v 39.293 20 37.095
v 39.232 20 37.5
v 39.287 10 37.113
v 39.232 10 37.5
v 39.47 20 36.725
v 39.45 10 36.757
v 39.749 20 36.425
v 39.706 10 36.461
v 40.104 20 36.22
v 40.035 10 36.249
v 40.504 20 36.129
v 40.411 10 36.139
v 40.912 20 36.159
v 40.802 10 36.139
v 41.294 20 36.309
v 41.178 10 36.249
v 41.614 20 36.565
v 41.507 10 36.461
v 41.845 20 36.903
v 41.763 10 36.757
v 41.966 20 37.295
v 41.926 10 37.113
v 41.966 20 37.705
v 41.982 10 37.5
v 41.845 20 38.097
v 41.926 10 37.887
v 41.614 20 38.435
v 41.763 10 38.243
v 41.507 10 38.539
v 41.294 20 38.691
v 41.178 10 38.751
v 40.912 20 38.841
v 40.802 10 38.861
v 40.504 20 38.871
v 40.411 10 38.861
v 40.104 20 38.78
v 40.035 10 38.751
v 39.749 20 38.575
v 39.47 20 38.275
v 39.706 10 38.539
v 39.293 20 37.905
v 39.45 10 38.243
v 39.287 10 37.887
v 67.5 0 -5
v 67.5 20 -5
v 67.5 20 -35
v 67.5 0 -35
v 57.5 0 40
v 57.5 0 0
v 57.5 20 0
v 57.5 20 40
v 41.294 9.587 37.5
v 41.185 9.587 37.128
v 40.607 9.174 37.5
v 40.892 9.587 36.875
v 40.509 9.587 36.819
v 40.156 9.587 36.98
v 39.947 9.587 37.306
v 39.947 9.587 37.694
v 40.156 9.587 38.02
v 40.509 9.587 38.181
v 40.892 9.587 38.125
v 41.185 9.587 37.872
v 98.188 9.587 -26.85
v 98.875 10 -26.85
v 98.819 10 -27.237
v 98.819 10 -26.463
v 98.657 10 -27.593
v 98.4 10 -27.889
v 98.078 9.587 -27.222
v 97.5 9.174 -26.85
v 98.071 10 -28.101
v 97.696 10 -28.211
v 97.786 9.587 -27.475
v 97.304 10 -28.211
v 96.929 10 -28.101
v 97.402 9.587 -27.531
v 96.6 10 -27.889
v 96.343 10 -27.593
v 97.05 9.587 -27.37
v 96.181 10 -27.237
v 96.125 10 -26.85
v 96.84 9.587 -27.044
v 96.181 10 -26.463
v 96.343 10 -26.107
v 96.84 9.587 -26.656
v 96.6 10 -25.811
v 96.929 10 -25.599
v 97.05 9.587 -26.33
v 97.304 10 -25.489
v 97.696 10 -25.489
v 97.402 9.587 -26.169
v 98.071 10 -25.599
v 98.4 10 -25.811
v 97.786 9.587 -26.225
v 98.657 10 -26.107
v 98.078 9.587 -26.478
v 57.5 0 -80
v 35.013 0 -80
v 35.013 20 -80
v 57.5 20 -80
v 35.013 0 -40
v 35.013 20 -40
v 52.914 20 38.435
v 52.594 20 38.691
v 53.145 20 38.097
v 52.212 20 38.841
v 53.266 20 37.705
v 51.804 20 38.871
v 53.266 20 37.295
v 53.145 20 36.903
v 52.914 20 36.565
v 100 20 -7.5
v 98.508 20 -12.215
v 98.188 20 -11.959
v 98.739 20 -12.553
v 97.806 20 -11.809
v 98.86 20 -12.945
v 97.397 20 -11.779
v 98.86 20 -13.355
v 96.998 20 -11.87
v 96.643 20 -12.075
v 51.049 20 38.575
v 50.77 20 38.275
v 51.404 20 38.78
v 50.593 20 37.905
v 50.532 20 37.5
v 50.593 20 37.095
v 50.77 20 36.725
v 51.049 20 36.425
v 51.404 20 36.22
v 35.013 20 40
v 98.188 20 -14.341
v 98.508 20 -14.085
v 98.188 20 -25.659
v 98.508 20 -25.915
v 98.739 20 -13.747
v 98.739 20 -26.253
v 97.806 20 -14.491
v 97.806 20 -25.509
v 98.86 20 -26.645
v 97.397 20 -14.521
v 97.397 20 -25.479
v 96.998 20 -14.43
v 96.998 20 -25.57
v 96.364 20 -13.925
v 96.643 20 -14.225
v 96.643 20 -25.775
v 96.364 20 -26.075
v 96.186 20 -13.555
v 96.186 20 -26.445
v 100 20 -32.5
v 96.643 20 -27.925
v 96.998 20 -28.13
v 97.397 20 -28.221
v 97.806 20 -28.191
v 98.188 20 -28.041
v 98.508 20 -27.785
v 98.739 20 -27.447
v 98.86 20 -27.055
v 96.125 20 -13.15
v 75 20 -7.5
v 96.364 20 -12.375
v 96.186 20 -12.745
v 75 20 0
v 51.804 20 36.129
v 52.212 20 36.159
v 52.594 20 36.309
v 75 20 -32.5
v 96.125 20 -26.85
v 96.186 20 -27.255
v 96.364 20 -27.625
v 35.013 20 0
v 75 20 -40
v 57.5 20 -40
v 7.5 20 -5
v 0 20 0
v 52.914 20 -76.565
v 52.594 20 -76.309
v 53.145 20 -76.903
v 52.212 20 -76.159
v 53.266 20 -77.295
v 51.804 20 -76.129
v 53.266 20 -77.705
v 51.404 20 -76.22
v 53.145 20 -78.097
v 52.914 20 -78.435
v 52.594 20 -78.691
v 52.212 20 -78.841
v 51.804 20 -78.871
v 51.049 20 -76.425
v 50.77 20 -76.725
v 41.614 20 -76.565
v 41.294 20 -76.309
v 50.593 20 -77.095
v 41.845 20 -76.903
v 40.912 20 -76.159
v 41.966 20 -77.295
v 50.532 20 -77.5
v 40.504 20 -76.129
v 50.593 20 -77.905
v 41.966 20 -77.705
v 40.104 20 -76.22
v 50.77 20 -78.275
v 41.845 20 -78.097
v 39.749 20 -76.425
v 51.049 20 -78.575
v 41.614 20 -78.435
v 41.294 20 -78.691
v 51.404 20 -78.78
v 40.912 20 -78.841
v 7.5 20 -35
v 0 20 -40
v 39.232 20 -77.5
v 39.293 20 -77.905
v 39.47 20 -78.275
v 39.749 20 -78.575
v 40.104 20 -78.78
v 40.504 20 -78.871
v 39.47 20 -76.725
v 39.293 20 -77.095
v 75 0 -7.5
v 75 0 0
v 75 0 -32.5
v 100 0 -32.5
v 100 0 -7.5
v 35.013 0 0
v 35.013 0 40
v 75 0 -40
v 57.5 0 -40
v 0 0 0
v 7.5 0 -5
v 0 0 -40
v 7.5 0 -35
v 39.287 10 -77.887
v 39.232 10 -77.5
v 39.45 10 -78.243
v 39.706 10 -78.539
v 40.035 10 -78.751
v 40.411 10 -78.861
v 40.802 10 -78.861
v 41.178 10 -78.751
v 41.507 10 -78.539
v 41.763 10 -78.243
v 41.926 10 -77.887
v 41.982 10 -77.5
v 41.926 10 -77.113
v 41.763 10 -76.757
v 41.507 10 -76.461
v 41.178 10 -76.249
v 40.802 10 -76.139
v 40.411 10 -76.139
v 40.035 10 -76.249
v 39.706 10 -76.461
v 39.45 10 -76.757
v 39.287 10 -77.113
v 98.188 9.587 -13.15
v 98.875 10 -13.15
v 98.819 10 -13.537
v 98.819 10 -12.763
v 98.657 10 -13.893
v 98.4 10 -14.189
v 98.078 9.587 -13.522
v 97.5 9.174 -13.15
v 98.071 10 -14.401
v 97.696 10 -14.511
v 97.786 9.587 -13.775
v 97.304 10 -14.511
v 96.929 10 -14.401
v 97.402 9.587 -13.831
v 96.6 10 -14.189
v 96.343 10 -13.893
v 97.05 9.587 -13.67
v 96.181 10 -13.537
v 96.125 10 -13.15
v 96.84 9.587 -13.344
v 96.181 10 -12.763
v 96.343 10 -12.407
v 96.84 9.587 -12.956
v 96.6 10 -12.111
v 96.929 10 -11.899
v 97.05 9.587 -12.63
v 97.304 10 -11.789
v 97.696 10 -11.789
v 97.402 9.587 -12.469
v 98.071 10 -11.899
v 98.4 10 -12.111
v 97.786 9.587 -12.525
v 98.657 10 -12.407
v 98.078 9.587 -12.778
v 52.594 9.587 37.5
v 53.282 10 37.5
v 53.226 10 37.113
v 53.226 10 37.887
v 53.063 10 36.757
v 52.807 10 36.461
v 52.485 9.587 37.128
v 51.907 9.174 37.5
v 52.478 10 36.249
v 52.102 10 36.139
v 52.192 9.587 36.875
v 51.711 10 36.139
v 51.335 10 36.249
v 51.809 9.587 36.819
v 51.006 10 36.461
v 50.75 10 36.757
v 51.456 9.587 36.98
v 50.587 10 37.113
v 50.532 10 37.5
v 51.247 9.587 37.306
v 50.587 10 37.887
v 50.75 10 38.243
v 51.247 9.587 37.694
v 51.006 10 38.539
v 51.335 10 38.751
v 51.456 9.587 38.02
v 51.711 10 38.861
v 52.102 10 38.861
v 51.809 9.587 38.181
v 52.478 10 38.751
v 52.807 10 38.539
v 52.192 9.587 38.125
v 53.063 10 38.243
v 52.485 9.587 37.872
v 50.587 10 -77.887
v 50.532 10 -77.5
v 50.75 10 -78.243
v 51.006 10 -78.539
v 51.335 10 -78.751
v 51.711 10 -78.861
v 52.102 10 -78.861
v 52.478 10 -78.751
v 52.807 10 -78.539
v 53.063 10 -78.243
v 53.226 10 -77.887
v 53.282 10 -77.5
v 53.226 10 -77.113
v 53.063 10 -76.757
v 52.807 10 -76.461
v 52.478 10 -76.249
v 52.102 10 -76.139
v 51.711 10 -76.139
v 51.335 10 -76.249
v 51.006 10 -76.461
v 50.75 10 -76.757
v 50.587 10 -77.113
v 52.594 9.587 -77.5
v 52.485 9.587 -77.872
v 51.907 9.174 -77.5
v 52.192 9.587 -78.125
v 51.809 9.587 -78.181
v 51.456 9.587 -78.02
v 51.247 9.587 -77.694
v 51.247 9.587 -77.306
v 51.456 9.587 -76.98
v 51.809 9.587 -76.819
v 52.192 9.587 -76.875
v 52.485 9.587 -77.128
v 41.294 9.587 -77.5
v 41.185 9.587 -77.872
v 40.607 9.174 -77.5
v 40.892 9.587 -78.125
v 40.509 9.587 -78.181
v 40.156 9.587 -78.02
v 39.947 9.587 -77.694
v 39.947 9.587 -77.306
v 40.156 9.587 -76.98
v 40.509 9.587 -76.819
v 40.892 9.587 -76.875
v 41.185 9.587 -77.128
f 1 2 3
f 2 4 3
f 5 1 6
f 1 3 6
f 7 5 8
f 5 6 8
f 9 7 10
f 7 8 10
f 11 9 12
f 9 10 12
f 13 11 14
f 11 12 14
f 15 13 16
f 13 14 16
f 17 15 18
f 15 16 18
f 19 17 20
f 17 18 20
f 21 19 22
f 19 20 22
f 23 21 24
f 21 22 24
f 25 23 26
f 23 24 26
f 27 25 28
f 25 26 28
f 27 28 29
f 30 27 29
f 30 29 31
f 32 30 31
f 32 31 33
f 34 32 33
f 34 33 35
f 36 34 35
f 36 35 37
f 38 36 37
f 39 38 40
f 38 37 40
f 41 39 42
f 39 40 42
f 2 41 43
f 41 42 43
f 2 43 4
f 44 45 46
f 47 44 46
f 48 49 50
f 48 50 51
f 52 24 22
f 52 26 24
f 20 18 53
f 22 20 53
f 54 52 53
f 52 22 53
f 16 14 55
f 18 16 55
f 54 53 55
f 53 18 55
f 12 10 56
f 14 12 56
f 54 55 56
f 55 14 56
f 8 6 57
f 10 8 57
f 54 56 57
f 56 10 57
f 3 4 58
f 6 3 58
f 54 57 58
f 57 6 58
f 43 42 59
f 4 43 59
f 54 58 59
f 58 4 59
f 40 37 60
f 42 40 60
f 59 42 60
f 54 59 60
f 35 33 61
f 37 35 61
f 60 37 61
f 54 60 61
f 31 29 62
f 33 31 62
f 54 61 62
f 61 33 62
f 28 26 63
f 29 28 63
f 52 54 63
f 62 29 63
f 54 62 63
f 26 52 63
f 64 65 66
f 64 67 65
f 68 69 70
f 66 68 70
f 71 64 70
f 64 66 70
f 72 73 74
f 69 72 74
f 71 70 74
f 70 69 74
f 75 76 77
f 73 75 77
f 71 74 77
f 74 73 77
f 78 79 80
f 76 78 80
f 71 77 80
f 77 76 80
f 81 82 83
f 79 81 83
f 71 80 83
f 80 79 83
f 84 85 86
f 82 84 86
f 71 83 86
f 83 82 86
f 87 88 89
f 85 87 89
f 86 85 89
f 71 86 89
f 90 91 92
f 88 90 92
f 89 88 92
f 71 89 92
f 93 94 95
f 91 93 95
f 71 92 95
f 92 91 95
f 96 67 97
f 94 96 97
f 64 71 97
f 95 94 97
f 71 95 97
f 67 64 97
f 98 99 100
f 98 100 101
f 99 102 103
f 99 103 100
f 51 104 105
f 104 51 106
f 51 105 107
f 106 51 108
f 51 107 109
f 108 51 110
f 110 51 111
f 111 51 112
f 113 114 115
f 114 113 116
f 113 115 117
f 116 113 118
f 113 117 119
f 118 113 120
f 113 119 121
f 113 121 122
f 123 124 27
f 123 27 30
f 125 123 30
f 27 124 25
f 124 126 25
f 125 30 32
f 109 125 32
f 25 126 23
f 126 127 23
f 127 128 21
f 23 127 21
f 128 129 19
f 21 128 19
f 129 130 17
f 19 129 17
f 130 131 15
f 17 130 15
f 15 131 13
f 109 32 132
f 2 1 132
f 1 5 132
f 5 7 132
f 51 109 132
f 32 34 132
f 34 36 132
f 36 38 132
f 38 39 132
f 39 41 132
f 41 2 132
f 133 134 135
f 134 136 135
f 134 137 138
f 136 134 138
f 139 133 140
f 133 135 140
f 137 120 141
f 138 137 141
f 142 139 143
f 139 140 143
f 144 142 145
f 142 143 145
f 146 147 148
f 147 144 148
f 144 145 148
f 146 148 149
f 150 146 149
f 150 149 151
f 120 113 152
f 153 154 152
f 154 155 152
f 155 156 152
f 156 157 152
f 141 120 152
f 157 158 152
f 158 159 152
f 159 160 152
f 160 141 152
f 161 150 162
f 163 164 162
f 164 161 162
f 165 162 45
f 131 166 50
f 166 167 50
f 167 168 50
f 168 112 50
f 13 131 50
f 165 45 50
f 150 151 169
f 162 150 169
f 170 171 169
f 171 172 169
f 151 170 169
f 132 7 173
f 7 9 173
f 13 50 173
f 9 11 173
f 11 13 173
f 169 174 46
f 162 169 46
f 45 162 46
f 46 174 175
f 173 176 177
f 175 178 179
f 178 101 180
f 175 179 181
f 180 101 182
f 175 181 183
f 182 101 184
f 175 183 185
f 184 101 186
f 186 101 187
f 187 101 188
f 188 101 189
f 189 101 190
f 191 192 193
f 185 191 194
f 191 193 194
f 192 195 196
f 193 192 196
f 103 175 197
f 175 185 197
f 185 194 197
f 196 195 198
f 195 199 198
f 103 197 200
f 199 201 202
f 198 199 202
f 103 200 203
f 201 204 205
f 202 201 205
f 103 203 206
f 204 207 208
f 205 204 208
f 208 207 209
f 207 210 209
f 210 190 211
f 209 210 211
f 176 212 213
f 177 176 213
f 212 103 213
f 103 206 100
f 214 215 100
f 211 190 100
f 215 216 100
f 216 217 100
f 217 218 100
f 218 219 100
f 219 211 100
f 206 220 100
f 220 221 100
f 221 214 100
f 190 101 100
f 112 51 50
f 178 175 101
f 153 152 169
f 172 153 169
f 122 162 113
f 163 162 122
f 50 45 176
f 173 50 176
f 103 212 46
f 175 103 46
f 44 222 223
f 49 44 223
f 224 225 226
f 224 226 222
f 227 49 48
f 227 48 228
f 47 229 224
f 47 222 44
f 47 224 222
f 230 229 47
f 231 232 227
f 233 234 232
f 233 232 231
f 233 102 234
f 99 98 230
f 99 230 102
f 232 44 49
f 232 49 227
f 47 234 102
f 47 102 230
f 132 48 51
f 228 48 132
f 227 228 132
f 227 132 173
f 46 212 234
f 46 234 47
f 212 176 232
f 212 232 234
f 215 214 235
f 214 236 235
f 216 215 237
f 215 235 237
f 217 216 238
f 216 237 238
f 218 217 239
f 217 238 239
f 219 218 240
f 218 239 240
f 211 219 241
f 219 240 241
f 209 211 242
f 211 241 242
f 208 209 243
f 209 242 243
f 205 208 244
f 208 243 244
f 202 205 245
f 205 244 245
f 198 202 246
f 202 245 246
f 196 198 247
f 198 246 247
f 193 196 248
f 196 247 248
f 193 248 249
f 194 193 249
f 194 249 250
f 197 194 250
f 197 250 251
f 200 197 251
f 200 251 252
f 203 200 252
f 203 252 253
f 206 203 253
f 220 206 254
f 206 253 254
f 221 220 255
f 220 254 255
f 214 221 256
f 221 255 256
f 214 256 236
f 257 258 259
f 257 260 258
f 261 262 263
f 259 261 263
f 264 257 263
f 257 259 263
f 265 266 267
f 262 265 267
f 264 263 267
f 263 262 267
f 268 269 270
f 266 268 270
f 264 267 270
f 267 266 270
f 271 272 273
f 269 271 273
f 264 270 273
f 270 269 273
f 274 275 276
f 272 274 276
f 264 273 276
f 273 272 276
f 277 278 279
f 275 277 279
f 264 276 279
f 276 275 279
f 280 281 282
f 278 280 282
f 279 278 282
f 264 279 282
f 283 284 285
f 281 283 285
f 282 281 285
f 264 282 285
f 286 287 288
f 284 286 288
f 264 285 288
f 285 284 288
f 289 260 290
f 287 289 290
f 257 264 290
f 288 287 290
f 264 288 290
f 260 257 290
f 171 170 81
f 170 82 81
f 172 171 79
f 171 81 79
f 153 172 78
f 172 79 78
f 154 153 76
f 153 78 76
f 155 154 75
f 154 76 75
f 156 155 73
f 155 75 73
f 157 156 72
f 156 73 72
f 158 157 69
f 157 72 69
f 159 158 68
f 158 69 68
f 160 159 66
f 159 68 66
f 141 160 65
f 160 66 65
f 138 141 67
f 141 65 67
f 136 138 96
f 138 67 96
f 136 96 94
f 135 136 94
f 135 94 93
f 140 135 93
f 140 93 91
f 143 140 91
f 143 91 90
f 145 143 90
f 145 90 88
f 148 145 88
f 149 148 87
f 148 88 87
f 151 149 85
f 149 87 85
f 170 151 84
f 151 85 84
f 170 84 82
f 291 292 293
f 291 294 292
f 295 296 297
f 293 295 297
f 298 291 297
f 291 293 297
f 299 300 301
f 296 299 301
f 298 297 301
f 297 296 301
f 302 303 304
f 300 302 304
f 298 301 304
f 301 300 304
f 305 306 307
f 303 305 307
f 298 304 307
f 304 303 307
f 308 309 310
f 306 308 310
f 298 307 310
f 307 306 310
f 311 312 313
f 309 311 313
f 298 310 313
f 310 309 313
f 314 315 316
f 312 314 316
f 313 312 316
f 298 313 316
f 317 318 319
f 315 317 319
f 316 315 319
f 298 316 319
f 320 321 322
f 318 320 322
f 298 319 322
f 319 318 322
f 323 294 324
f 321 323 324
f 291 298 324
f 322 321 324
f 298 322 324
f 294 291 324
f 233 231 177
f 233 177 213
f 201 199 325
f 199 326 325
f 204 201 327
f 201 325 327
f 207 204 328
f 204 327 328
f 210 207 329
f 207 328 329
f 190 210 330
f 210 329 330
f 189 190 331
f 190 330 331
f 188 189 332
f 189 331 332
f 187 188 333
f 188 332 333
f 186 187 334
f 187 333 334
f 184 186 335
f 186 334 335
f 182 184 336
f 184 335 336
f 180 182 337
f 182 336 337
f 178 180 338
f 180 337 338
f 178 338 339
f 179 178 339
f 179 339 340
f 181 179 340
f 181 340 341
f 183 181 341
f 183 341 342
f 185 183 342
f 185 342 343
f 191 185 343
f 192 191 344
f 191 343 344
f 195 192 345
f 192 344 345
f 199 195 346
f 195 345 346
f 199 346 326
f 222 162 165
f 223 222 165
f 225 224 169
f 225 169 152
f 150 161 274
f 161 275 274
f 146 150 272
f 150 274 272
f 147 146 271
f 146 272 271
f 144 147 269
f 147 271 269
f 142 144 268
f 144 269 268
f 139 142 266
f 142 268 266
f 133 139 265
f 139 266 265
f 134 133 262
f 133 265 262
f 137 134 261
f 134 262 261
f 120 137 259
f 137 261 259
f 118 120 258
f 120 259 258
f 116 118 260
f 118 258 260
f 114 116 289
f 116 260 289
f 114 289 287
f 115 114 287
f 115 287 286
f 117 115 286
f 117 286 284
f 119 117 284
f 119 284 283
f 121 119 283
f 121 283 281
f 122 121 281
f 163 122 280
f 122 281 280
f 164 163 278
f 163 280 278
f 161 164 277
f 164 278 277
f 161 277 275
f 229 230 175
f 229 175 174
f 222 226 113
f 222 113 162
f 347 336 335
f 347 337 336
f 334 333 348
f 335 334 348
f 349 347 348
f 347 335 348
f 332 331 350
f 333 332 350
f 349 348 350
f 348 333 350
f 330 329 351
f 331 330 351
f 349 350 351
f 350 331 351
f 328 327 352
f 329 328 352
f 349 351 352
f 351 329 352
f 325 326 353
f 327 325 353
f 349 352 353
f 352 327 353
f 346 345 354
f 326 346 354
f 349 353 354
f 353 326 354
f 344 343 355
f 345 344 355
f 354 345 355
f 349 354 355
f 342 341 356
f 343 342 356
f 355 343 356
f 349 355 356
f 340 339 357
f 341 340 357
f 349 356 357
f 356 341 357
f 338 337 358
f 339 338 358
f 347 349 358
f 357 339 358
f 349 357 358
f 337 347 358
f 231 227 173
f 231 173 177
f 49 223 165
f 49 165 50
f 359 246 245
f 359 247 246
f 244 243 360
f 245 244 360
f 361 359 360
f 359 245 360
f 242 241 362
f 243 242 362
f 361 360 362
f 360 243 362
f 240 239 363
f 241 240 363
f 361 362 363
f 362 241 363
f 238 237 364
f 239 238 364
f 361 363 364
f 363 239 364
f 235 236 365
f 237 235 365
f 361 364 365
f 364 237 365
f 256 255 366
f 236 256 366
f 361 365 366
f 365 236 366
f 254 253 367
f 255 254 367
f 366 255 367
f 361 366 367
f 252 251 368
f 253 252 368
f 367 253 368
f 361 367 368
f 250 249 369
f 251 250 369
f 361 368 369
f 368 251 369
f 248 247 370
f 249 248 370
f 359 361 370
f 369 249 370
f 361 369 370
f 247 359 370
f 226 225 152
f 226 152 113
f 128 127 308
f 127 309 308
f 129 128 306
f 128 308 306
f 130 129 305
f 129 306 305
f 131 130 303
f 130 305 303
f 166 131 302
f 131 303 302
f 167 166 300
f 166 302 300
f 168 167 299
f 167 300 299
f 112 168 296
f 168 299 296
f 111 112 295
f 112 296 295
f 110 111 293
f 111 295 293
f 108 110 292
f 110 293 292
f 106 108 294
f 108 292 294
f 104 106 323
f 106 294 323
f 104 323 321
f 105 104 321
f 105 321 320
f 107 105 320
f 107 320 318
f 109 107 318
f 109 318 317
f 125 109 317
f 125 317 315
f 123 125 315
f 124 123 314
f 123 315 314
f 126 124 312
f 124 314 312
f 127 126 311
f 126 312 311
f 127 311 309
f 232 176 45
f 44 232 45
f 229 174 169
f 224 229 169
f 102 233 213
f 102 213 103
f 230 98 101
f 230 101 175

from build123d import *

# Parameters (mm, degrees)
BOSS_EXTRUDE1_DEPTH       = 20
CUT_EXTRUDE1_REACH        = 131.615
SKETCH3_W                 = 60
SKETCH3_H                 = 30
F_1_0MM_DOWEL_HOLE4_D     = 2.75
F_1_0MM_DOWEL_HOLE4_DEPTH = 10
F_1_0MM_DOWEL_HOLE4_TIP   = 0.826183351


with BuildPart() as part:
    # Sketch2 → Boss-Extrude1 (new body)
    with BuildSketch(Plane(origin=(0, 0, 0), x_dir=(1, 0, 0), z_dir=(0, 1, 0))):
        Polygon((57.5, 0), (57.5, -40), (35.013042541, -40), (35.013042541, 0), (0, 0), (0, 40), (35.013042541, 40), (35.013042541, 80), (57.5, 80), (57.5, 40), (75, 40), (75, 32.5), (100, 32.5), (100, 7.5), (75, 7.5), (75, 0), align=None)
    extrude(amount=BOSS_EXTRUDE1_DEPTH)

    # Sketch3 → Cut-Extrude1 (cut, up to next)
    with BuildSketch(Plane(origin=(0, 20, 0), x_dir=(1, 0, 0), z_dir=(0, 1, 0)), mode=Mode.PRIVATE) as cut_extrude1_sk1:
        with Locations((37.5, 20)):
            Rectangle(SKETCH3_W, SKETCH3_H)
    cut_extrude1_tool1 = extrude(cut_extrude1_sk1.sketch, amount=-CUT_EXTRUDE1_REACH, mode=Mode.PRIVATE) & part.part
    add(cut_extrude1_tool1.solids().sort_by_distance((37.5, 20, -20))[0], mode=Mode.SUBTRACT)

    # Ø1.0mm Dowel Hole4
    with Locations(Plane(origin=(0, 20, 0), x_dir=(1, 0, 0), z_dir=(0, 1, 0))):
        with Locations((51.90652127, 77.5), (40.60652127, -37.5), (51.90652127, -37.5), (97.5, 13.15), (97.5, 26.85), (40.60652127, 77.5)):
            Hole(F_1_0MM_DOWEL_HOLE4_D / 2, depth=F_1_0MM_DOWEL_HOLE4_DEPTH)
            with Locations((0, 0, -(F_1_0MM_DOWEL_HOLE4_DEPTH + F_1_0MM_DOWEL_HOLE4_TIP / 2))):  # 118° drill point
                Cone(0, F_1_0MM_DOWEL_HOLE4_D / 2, F_1_0MM_DOWEL_HOLE4_TIP, mode=Mode.SUBTRACT)


solid = part.part
